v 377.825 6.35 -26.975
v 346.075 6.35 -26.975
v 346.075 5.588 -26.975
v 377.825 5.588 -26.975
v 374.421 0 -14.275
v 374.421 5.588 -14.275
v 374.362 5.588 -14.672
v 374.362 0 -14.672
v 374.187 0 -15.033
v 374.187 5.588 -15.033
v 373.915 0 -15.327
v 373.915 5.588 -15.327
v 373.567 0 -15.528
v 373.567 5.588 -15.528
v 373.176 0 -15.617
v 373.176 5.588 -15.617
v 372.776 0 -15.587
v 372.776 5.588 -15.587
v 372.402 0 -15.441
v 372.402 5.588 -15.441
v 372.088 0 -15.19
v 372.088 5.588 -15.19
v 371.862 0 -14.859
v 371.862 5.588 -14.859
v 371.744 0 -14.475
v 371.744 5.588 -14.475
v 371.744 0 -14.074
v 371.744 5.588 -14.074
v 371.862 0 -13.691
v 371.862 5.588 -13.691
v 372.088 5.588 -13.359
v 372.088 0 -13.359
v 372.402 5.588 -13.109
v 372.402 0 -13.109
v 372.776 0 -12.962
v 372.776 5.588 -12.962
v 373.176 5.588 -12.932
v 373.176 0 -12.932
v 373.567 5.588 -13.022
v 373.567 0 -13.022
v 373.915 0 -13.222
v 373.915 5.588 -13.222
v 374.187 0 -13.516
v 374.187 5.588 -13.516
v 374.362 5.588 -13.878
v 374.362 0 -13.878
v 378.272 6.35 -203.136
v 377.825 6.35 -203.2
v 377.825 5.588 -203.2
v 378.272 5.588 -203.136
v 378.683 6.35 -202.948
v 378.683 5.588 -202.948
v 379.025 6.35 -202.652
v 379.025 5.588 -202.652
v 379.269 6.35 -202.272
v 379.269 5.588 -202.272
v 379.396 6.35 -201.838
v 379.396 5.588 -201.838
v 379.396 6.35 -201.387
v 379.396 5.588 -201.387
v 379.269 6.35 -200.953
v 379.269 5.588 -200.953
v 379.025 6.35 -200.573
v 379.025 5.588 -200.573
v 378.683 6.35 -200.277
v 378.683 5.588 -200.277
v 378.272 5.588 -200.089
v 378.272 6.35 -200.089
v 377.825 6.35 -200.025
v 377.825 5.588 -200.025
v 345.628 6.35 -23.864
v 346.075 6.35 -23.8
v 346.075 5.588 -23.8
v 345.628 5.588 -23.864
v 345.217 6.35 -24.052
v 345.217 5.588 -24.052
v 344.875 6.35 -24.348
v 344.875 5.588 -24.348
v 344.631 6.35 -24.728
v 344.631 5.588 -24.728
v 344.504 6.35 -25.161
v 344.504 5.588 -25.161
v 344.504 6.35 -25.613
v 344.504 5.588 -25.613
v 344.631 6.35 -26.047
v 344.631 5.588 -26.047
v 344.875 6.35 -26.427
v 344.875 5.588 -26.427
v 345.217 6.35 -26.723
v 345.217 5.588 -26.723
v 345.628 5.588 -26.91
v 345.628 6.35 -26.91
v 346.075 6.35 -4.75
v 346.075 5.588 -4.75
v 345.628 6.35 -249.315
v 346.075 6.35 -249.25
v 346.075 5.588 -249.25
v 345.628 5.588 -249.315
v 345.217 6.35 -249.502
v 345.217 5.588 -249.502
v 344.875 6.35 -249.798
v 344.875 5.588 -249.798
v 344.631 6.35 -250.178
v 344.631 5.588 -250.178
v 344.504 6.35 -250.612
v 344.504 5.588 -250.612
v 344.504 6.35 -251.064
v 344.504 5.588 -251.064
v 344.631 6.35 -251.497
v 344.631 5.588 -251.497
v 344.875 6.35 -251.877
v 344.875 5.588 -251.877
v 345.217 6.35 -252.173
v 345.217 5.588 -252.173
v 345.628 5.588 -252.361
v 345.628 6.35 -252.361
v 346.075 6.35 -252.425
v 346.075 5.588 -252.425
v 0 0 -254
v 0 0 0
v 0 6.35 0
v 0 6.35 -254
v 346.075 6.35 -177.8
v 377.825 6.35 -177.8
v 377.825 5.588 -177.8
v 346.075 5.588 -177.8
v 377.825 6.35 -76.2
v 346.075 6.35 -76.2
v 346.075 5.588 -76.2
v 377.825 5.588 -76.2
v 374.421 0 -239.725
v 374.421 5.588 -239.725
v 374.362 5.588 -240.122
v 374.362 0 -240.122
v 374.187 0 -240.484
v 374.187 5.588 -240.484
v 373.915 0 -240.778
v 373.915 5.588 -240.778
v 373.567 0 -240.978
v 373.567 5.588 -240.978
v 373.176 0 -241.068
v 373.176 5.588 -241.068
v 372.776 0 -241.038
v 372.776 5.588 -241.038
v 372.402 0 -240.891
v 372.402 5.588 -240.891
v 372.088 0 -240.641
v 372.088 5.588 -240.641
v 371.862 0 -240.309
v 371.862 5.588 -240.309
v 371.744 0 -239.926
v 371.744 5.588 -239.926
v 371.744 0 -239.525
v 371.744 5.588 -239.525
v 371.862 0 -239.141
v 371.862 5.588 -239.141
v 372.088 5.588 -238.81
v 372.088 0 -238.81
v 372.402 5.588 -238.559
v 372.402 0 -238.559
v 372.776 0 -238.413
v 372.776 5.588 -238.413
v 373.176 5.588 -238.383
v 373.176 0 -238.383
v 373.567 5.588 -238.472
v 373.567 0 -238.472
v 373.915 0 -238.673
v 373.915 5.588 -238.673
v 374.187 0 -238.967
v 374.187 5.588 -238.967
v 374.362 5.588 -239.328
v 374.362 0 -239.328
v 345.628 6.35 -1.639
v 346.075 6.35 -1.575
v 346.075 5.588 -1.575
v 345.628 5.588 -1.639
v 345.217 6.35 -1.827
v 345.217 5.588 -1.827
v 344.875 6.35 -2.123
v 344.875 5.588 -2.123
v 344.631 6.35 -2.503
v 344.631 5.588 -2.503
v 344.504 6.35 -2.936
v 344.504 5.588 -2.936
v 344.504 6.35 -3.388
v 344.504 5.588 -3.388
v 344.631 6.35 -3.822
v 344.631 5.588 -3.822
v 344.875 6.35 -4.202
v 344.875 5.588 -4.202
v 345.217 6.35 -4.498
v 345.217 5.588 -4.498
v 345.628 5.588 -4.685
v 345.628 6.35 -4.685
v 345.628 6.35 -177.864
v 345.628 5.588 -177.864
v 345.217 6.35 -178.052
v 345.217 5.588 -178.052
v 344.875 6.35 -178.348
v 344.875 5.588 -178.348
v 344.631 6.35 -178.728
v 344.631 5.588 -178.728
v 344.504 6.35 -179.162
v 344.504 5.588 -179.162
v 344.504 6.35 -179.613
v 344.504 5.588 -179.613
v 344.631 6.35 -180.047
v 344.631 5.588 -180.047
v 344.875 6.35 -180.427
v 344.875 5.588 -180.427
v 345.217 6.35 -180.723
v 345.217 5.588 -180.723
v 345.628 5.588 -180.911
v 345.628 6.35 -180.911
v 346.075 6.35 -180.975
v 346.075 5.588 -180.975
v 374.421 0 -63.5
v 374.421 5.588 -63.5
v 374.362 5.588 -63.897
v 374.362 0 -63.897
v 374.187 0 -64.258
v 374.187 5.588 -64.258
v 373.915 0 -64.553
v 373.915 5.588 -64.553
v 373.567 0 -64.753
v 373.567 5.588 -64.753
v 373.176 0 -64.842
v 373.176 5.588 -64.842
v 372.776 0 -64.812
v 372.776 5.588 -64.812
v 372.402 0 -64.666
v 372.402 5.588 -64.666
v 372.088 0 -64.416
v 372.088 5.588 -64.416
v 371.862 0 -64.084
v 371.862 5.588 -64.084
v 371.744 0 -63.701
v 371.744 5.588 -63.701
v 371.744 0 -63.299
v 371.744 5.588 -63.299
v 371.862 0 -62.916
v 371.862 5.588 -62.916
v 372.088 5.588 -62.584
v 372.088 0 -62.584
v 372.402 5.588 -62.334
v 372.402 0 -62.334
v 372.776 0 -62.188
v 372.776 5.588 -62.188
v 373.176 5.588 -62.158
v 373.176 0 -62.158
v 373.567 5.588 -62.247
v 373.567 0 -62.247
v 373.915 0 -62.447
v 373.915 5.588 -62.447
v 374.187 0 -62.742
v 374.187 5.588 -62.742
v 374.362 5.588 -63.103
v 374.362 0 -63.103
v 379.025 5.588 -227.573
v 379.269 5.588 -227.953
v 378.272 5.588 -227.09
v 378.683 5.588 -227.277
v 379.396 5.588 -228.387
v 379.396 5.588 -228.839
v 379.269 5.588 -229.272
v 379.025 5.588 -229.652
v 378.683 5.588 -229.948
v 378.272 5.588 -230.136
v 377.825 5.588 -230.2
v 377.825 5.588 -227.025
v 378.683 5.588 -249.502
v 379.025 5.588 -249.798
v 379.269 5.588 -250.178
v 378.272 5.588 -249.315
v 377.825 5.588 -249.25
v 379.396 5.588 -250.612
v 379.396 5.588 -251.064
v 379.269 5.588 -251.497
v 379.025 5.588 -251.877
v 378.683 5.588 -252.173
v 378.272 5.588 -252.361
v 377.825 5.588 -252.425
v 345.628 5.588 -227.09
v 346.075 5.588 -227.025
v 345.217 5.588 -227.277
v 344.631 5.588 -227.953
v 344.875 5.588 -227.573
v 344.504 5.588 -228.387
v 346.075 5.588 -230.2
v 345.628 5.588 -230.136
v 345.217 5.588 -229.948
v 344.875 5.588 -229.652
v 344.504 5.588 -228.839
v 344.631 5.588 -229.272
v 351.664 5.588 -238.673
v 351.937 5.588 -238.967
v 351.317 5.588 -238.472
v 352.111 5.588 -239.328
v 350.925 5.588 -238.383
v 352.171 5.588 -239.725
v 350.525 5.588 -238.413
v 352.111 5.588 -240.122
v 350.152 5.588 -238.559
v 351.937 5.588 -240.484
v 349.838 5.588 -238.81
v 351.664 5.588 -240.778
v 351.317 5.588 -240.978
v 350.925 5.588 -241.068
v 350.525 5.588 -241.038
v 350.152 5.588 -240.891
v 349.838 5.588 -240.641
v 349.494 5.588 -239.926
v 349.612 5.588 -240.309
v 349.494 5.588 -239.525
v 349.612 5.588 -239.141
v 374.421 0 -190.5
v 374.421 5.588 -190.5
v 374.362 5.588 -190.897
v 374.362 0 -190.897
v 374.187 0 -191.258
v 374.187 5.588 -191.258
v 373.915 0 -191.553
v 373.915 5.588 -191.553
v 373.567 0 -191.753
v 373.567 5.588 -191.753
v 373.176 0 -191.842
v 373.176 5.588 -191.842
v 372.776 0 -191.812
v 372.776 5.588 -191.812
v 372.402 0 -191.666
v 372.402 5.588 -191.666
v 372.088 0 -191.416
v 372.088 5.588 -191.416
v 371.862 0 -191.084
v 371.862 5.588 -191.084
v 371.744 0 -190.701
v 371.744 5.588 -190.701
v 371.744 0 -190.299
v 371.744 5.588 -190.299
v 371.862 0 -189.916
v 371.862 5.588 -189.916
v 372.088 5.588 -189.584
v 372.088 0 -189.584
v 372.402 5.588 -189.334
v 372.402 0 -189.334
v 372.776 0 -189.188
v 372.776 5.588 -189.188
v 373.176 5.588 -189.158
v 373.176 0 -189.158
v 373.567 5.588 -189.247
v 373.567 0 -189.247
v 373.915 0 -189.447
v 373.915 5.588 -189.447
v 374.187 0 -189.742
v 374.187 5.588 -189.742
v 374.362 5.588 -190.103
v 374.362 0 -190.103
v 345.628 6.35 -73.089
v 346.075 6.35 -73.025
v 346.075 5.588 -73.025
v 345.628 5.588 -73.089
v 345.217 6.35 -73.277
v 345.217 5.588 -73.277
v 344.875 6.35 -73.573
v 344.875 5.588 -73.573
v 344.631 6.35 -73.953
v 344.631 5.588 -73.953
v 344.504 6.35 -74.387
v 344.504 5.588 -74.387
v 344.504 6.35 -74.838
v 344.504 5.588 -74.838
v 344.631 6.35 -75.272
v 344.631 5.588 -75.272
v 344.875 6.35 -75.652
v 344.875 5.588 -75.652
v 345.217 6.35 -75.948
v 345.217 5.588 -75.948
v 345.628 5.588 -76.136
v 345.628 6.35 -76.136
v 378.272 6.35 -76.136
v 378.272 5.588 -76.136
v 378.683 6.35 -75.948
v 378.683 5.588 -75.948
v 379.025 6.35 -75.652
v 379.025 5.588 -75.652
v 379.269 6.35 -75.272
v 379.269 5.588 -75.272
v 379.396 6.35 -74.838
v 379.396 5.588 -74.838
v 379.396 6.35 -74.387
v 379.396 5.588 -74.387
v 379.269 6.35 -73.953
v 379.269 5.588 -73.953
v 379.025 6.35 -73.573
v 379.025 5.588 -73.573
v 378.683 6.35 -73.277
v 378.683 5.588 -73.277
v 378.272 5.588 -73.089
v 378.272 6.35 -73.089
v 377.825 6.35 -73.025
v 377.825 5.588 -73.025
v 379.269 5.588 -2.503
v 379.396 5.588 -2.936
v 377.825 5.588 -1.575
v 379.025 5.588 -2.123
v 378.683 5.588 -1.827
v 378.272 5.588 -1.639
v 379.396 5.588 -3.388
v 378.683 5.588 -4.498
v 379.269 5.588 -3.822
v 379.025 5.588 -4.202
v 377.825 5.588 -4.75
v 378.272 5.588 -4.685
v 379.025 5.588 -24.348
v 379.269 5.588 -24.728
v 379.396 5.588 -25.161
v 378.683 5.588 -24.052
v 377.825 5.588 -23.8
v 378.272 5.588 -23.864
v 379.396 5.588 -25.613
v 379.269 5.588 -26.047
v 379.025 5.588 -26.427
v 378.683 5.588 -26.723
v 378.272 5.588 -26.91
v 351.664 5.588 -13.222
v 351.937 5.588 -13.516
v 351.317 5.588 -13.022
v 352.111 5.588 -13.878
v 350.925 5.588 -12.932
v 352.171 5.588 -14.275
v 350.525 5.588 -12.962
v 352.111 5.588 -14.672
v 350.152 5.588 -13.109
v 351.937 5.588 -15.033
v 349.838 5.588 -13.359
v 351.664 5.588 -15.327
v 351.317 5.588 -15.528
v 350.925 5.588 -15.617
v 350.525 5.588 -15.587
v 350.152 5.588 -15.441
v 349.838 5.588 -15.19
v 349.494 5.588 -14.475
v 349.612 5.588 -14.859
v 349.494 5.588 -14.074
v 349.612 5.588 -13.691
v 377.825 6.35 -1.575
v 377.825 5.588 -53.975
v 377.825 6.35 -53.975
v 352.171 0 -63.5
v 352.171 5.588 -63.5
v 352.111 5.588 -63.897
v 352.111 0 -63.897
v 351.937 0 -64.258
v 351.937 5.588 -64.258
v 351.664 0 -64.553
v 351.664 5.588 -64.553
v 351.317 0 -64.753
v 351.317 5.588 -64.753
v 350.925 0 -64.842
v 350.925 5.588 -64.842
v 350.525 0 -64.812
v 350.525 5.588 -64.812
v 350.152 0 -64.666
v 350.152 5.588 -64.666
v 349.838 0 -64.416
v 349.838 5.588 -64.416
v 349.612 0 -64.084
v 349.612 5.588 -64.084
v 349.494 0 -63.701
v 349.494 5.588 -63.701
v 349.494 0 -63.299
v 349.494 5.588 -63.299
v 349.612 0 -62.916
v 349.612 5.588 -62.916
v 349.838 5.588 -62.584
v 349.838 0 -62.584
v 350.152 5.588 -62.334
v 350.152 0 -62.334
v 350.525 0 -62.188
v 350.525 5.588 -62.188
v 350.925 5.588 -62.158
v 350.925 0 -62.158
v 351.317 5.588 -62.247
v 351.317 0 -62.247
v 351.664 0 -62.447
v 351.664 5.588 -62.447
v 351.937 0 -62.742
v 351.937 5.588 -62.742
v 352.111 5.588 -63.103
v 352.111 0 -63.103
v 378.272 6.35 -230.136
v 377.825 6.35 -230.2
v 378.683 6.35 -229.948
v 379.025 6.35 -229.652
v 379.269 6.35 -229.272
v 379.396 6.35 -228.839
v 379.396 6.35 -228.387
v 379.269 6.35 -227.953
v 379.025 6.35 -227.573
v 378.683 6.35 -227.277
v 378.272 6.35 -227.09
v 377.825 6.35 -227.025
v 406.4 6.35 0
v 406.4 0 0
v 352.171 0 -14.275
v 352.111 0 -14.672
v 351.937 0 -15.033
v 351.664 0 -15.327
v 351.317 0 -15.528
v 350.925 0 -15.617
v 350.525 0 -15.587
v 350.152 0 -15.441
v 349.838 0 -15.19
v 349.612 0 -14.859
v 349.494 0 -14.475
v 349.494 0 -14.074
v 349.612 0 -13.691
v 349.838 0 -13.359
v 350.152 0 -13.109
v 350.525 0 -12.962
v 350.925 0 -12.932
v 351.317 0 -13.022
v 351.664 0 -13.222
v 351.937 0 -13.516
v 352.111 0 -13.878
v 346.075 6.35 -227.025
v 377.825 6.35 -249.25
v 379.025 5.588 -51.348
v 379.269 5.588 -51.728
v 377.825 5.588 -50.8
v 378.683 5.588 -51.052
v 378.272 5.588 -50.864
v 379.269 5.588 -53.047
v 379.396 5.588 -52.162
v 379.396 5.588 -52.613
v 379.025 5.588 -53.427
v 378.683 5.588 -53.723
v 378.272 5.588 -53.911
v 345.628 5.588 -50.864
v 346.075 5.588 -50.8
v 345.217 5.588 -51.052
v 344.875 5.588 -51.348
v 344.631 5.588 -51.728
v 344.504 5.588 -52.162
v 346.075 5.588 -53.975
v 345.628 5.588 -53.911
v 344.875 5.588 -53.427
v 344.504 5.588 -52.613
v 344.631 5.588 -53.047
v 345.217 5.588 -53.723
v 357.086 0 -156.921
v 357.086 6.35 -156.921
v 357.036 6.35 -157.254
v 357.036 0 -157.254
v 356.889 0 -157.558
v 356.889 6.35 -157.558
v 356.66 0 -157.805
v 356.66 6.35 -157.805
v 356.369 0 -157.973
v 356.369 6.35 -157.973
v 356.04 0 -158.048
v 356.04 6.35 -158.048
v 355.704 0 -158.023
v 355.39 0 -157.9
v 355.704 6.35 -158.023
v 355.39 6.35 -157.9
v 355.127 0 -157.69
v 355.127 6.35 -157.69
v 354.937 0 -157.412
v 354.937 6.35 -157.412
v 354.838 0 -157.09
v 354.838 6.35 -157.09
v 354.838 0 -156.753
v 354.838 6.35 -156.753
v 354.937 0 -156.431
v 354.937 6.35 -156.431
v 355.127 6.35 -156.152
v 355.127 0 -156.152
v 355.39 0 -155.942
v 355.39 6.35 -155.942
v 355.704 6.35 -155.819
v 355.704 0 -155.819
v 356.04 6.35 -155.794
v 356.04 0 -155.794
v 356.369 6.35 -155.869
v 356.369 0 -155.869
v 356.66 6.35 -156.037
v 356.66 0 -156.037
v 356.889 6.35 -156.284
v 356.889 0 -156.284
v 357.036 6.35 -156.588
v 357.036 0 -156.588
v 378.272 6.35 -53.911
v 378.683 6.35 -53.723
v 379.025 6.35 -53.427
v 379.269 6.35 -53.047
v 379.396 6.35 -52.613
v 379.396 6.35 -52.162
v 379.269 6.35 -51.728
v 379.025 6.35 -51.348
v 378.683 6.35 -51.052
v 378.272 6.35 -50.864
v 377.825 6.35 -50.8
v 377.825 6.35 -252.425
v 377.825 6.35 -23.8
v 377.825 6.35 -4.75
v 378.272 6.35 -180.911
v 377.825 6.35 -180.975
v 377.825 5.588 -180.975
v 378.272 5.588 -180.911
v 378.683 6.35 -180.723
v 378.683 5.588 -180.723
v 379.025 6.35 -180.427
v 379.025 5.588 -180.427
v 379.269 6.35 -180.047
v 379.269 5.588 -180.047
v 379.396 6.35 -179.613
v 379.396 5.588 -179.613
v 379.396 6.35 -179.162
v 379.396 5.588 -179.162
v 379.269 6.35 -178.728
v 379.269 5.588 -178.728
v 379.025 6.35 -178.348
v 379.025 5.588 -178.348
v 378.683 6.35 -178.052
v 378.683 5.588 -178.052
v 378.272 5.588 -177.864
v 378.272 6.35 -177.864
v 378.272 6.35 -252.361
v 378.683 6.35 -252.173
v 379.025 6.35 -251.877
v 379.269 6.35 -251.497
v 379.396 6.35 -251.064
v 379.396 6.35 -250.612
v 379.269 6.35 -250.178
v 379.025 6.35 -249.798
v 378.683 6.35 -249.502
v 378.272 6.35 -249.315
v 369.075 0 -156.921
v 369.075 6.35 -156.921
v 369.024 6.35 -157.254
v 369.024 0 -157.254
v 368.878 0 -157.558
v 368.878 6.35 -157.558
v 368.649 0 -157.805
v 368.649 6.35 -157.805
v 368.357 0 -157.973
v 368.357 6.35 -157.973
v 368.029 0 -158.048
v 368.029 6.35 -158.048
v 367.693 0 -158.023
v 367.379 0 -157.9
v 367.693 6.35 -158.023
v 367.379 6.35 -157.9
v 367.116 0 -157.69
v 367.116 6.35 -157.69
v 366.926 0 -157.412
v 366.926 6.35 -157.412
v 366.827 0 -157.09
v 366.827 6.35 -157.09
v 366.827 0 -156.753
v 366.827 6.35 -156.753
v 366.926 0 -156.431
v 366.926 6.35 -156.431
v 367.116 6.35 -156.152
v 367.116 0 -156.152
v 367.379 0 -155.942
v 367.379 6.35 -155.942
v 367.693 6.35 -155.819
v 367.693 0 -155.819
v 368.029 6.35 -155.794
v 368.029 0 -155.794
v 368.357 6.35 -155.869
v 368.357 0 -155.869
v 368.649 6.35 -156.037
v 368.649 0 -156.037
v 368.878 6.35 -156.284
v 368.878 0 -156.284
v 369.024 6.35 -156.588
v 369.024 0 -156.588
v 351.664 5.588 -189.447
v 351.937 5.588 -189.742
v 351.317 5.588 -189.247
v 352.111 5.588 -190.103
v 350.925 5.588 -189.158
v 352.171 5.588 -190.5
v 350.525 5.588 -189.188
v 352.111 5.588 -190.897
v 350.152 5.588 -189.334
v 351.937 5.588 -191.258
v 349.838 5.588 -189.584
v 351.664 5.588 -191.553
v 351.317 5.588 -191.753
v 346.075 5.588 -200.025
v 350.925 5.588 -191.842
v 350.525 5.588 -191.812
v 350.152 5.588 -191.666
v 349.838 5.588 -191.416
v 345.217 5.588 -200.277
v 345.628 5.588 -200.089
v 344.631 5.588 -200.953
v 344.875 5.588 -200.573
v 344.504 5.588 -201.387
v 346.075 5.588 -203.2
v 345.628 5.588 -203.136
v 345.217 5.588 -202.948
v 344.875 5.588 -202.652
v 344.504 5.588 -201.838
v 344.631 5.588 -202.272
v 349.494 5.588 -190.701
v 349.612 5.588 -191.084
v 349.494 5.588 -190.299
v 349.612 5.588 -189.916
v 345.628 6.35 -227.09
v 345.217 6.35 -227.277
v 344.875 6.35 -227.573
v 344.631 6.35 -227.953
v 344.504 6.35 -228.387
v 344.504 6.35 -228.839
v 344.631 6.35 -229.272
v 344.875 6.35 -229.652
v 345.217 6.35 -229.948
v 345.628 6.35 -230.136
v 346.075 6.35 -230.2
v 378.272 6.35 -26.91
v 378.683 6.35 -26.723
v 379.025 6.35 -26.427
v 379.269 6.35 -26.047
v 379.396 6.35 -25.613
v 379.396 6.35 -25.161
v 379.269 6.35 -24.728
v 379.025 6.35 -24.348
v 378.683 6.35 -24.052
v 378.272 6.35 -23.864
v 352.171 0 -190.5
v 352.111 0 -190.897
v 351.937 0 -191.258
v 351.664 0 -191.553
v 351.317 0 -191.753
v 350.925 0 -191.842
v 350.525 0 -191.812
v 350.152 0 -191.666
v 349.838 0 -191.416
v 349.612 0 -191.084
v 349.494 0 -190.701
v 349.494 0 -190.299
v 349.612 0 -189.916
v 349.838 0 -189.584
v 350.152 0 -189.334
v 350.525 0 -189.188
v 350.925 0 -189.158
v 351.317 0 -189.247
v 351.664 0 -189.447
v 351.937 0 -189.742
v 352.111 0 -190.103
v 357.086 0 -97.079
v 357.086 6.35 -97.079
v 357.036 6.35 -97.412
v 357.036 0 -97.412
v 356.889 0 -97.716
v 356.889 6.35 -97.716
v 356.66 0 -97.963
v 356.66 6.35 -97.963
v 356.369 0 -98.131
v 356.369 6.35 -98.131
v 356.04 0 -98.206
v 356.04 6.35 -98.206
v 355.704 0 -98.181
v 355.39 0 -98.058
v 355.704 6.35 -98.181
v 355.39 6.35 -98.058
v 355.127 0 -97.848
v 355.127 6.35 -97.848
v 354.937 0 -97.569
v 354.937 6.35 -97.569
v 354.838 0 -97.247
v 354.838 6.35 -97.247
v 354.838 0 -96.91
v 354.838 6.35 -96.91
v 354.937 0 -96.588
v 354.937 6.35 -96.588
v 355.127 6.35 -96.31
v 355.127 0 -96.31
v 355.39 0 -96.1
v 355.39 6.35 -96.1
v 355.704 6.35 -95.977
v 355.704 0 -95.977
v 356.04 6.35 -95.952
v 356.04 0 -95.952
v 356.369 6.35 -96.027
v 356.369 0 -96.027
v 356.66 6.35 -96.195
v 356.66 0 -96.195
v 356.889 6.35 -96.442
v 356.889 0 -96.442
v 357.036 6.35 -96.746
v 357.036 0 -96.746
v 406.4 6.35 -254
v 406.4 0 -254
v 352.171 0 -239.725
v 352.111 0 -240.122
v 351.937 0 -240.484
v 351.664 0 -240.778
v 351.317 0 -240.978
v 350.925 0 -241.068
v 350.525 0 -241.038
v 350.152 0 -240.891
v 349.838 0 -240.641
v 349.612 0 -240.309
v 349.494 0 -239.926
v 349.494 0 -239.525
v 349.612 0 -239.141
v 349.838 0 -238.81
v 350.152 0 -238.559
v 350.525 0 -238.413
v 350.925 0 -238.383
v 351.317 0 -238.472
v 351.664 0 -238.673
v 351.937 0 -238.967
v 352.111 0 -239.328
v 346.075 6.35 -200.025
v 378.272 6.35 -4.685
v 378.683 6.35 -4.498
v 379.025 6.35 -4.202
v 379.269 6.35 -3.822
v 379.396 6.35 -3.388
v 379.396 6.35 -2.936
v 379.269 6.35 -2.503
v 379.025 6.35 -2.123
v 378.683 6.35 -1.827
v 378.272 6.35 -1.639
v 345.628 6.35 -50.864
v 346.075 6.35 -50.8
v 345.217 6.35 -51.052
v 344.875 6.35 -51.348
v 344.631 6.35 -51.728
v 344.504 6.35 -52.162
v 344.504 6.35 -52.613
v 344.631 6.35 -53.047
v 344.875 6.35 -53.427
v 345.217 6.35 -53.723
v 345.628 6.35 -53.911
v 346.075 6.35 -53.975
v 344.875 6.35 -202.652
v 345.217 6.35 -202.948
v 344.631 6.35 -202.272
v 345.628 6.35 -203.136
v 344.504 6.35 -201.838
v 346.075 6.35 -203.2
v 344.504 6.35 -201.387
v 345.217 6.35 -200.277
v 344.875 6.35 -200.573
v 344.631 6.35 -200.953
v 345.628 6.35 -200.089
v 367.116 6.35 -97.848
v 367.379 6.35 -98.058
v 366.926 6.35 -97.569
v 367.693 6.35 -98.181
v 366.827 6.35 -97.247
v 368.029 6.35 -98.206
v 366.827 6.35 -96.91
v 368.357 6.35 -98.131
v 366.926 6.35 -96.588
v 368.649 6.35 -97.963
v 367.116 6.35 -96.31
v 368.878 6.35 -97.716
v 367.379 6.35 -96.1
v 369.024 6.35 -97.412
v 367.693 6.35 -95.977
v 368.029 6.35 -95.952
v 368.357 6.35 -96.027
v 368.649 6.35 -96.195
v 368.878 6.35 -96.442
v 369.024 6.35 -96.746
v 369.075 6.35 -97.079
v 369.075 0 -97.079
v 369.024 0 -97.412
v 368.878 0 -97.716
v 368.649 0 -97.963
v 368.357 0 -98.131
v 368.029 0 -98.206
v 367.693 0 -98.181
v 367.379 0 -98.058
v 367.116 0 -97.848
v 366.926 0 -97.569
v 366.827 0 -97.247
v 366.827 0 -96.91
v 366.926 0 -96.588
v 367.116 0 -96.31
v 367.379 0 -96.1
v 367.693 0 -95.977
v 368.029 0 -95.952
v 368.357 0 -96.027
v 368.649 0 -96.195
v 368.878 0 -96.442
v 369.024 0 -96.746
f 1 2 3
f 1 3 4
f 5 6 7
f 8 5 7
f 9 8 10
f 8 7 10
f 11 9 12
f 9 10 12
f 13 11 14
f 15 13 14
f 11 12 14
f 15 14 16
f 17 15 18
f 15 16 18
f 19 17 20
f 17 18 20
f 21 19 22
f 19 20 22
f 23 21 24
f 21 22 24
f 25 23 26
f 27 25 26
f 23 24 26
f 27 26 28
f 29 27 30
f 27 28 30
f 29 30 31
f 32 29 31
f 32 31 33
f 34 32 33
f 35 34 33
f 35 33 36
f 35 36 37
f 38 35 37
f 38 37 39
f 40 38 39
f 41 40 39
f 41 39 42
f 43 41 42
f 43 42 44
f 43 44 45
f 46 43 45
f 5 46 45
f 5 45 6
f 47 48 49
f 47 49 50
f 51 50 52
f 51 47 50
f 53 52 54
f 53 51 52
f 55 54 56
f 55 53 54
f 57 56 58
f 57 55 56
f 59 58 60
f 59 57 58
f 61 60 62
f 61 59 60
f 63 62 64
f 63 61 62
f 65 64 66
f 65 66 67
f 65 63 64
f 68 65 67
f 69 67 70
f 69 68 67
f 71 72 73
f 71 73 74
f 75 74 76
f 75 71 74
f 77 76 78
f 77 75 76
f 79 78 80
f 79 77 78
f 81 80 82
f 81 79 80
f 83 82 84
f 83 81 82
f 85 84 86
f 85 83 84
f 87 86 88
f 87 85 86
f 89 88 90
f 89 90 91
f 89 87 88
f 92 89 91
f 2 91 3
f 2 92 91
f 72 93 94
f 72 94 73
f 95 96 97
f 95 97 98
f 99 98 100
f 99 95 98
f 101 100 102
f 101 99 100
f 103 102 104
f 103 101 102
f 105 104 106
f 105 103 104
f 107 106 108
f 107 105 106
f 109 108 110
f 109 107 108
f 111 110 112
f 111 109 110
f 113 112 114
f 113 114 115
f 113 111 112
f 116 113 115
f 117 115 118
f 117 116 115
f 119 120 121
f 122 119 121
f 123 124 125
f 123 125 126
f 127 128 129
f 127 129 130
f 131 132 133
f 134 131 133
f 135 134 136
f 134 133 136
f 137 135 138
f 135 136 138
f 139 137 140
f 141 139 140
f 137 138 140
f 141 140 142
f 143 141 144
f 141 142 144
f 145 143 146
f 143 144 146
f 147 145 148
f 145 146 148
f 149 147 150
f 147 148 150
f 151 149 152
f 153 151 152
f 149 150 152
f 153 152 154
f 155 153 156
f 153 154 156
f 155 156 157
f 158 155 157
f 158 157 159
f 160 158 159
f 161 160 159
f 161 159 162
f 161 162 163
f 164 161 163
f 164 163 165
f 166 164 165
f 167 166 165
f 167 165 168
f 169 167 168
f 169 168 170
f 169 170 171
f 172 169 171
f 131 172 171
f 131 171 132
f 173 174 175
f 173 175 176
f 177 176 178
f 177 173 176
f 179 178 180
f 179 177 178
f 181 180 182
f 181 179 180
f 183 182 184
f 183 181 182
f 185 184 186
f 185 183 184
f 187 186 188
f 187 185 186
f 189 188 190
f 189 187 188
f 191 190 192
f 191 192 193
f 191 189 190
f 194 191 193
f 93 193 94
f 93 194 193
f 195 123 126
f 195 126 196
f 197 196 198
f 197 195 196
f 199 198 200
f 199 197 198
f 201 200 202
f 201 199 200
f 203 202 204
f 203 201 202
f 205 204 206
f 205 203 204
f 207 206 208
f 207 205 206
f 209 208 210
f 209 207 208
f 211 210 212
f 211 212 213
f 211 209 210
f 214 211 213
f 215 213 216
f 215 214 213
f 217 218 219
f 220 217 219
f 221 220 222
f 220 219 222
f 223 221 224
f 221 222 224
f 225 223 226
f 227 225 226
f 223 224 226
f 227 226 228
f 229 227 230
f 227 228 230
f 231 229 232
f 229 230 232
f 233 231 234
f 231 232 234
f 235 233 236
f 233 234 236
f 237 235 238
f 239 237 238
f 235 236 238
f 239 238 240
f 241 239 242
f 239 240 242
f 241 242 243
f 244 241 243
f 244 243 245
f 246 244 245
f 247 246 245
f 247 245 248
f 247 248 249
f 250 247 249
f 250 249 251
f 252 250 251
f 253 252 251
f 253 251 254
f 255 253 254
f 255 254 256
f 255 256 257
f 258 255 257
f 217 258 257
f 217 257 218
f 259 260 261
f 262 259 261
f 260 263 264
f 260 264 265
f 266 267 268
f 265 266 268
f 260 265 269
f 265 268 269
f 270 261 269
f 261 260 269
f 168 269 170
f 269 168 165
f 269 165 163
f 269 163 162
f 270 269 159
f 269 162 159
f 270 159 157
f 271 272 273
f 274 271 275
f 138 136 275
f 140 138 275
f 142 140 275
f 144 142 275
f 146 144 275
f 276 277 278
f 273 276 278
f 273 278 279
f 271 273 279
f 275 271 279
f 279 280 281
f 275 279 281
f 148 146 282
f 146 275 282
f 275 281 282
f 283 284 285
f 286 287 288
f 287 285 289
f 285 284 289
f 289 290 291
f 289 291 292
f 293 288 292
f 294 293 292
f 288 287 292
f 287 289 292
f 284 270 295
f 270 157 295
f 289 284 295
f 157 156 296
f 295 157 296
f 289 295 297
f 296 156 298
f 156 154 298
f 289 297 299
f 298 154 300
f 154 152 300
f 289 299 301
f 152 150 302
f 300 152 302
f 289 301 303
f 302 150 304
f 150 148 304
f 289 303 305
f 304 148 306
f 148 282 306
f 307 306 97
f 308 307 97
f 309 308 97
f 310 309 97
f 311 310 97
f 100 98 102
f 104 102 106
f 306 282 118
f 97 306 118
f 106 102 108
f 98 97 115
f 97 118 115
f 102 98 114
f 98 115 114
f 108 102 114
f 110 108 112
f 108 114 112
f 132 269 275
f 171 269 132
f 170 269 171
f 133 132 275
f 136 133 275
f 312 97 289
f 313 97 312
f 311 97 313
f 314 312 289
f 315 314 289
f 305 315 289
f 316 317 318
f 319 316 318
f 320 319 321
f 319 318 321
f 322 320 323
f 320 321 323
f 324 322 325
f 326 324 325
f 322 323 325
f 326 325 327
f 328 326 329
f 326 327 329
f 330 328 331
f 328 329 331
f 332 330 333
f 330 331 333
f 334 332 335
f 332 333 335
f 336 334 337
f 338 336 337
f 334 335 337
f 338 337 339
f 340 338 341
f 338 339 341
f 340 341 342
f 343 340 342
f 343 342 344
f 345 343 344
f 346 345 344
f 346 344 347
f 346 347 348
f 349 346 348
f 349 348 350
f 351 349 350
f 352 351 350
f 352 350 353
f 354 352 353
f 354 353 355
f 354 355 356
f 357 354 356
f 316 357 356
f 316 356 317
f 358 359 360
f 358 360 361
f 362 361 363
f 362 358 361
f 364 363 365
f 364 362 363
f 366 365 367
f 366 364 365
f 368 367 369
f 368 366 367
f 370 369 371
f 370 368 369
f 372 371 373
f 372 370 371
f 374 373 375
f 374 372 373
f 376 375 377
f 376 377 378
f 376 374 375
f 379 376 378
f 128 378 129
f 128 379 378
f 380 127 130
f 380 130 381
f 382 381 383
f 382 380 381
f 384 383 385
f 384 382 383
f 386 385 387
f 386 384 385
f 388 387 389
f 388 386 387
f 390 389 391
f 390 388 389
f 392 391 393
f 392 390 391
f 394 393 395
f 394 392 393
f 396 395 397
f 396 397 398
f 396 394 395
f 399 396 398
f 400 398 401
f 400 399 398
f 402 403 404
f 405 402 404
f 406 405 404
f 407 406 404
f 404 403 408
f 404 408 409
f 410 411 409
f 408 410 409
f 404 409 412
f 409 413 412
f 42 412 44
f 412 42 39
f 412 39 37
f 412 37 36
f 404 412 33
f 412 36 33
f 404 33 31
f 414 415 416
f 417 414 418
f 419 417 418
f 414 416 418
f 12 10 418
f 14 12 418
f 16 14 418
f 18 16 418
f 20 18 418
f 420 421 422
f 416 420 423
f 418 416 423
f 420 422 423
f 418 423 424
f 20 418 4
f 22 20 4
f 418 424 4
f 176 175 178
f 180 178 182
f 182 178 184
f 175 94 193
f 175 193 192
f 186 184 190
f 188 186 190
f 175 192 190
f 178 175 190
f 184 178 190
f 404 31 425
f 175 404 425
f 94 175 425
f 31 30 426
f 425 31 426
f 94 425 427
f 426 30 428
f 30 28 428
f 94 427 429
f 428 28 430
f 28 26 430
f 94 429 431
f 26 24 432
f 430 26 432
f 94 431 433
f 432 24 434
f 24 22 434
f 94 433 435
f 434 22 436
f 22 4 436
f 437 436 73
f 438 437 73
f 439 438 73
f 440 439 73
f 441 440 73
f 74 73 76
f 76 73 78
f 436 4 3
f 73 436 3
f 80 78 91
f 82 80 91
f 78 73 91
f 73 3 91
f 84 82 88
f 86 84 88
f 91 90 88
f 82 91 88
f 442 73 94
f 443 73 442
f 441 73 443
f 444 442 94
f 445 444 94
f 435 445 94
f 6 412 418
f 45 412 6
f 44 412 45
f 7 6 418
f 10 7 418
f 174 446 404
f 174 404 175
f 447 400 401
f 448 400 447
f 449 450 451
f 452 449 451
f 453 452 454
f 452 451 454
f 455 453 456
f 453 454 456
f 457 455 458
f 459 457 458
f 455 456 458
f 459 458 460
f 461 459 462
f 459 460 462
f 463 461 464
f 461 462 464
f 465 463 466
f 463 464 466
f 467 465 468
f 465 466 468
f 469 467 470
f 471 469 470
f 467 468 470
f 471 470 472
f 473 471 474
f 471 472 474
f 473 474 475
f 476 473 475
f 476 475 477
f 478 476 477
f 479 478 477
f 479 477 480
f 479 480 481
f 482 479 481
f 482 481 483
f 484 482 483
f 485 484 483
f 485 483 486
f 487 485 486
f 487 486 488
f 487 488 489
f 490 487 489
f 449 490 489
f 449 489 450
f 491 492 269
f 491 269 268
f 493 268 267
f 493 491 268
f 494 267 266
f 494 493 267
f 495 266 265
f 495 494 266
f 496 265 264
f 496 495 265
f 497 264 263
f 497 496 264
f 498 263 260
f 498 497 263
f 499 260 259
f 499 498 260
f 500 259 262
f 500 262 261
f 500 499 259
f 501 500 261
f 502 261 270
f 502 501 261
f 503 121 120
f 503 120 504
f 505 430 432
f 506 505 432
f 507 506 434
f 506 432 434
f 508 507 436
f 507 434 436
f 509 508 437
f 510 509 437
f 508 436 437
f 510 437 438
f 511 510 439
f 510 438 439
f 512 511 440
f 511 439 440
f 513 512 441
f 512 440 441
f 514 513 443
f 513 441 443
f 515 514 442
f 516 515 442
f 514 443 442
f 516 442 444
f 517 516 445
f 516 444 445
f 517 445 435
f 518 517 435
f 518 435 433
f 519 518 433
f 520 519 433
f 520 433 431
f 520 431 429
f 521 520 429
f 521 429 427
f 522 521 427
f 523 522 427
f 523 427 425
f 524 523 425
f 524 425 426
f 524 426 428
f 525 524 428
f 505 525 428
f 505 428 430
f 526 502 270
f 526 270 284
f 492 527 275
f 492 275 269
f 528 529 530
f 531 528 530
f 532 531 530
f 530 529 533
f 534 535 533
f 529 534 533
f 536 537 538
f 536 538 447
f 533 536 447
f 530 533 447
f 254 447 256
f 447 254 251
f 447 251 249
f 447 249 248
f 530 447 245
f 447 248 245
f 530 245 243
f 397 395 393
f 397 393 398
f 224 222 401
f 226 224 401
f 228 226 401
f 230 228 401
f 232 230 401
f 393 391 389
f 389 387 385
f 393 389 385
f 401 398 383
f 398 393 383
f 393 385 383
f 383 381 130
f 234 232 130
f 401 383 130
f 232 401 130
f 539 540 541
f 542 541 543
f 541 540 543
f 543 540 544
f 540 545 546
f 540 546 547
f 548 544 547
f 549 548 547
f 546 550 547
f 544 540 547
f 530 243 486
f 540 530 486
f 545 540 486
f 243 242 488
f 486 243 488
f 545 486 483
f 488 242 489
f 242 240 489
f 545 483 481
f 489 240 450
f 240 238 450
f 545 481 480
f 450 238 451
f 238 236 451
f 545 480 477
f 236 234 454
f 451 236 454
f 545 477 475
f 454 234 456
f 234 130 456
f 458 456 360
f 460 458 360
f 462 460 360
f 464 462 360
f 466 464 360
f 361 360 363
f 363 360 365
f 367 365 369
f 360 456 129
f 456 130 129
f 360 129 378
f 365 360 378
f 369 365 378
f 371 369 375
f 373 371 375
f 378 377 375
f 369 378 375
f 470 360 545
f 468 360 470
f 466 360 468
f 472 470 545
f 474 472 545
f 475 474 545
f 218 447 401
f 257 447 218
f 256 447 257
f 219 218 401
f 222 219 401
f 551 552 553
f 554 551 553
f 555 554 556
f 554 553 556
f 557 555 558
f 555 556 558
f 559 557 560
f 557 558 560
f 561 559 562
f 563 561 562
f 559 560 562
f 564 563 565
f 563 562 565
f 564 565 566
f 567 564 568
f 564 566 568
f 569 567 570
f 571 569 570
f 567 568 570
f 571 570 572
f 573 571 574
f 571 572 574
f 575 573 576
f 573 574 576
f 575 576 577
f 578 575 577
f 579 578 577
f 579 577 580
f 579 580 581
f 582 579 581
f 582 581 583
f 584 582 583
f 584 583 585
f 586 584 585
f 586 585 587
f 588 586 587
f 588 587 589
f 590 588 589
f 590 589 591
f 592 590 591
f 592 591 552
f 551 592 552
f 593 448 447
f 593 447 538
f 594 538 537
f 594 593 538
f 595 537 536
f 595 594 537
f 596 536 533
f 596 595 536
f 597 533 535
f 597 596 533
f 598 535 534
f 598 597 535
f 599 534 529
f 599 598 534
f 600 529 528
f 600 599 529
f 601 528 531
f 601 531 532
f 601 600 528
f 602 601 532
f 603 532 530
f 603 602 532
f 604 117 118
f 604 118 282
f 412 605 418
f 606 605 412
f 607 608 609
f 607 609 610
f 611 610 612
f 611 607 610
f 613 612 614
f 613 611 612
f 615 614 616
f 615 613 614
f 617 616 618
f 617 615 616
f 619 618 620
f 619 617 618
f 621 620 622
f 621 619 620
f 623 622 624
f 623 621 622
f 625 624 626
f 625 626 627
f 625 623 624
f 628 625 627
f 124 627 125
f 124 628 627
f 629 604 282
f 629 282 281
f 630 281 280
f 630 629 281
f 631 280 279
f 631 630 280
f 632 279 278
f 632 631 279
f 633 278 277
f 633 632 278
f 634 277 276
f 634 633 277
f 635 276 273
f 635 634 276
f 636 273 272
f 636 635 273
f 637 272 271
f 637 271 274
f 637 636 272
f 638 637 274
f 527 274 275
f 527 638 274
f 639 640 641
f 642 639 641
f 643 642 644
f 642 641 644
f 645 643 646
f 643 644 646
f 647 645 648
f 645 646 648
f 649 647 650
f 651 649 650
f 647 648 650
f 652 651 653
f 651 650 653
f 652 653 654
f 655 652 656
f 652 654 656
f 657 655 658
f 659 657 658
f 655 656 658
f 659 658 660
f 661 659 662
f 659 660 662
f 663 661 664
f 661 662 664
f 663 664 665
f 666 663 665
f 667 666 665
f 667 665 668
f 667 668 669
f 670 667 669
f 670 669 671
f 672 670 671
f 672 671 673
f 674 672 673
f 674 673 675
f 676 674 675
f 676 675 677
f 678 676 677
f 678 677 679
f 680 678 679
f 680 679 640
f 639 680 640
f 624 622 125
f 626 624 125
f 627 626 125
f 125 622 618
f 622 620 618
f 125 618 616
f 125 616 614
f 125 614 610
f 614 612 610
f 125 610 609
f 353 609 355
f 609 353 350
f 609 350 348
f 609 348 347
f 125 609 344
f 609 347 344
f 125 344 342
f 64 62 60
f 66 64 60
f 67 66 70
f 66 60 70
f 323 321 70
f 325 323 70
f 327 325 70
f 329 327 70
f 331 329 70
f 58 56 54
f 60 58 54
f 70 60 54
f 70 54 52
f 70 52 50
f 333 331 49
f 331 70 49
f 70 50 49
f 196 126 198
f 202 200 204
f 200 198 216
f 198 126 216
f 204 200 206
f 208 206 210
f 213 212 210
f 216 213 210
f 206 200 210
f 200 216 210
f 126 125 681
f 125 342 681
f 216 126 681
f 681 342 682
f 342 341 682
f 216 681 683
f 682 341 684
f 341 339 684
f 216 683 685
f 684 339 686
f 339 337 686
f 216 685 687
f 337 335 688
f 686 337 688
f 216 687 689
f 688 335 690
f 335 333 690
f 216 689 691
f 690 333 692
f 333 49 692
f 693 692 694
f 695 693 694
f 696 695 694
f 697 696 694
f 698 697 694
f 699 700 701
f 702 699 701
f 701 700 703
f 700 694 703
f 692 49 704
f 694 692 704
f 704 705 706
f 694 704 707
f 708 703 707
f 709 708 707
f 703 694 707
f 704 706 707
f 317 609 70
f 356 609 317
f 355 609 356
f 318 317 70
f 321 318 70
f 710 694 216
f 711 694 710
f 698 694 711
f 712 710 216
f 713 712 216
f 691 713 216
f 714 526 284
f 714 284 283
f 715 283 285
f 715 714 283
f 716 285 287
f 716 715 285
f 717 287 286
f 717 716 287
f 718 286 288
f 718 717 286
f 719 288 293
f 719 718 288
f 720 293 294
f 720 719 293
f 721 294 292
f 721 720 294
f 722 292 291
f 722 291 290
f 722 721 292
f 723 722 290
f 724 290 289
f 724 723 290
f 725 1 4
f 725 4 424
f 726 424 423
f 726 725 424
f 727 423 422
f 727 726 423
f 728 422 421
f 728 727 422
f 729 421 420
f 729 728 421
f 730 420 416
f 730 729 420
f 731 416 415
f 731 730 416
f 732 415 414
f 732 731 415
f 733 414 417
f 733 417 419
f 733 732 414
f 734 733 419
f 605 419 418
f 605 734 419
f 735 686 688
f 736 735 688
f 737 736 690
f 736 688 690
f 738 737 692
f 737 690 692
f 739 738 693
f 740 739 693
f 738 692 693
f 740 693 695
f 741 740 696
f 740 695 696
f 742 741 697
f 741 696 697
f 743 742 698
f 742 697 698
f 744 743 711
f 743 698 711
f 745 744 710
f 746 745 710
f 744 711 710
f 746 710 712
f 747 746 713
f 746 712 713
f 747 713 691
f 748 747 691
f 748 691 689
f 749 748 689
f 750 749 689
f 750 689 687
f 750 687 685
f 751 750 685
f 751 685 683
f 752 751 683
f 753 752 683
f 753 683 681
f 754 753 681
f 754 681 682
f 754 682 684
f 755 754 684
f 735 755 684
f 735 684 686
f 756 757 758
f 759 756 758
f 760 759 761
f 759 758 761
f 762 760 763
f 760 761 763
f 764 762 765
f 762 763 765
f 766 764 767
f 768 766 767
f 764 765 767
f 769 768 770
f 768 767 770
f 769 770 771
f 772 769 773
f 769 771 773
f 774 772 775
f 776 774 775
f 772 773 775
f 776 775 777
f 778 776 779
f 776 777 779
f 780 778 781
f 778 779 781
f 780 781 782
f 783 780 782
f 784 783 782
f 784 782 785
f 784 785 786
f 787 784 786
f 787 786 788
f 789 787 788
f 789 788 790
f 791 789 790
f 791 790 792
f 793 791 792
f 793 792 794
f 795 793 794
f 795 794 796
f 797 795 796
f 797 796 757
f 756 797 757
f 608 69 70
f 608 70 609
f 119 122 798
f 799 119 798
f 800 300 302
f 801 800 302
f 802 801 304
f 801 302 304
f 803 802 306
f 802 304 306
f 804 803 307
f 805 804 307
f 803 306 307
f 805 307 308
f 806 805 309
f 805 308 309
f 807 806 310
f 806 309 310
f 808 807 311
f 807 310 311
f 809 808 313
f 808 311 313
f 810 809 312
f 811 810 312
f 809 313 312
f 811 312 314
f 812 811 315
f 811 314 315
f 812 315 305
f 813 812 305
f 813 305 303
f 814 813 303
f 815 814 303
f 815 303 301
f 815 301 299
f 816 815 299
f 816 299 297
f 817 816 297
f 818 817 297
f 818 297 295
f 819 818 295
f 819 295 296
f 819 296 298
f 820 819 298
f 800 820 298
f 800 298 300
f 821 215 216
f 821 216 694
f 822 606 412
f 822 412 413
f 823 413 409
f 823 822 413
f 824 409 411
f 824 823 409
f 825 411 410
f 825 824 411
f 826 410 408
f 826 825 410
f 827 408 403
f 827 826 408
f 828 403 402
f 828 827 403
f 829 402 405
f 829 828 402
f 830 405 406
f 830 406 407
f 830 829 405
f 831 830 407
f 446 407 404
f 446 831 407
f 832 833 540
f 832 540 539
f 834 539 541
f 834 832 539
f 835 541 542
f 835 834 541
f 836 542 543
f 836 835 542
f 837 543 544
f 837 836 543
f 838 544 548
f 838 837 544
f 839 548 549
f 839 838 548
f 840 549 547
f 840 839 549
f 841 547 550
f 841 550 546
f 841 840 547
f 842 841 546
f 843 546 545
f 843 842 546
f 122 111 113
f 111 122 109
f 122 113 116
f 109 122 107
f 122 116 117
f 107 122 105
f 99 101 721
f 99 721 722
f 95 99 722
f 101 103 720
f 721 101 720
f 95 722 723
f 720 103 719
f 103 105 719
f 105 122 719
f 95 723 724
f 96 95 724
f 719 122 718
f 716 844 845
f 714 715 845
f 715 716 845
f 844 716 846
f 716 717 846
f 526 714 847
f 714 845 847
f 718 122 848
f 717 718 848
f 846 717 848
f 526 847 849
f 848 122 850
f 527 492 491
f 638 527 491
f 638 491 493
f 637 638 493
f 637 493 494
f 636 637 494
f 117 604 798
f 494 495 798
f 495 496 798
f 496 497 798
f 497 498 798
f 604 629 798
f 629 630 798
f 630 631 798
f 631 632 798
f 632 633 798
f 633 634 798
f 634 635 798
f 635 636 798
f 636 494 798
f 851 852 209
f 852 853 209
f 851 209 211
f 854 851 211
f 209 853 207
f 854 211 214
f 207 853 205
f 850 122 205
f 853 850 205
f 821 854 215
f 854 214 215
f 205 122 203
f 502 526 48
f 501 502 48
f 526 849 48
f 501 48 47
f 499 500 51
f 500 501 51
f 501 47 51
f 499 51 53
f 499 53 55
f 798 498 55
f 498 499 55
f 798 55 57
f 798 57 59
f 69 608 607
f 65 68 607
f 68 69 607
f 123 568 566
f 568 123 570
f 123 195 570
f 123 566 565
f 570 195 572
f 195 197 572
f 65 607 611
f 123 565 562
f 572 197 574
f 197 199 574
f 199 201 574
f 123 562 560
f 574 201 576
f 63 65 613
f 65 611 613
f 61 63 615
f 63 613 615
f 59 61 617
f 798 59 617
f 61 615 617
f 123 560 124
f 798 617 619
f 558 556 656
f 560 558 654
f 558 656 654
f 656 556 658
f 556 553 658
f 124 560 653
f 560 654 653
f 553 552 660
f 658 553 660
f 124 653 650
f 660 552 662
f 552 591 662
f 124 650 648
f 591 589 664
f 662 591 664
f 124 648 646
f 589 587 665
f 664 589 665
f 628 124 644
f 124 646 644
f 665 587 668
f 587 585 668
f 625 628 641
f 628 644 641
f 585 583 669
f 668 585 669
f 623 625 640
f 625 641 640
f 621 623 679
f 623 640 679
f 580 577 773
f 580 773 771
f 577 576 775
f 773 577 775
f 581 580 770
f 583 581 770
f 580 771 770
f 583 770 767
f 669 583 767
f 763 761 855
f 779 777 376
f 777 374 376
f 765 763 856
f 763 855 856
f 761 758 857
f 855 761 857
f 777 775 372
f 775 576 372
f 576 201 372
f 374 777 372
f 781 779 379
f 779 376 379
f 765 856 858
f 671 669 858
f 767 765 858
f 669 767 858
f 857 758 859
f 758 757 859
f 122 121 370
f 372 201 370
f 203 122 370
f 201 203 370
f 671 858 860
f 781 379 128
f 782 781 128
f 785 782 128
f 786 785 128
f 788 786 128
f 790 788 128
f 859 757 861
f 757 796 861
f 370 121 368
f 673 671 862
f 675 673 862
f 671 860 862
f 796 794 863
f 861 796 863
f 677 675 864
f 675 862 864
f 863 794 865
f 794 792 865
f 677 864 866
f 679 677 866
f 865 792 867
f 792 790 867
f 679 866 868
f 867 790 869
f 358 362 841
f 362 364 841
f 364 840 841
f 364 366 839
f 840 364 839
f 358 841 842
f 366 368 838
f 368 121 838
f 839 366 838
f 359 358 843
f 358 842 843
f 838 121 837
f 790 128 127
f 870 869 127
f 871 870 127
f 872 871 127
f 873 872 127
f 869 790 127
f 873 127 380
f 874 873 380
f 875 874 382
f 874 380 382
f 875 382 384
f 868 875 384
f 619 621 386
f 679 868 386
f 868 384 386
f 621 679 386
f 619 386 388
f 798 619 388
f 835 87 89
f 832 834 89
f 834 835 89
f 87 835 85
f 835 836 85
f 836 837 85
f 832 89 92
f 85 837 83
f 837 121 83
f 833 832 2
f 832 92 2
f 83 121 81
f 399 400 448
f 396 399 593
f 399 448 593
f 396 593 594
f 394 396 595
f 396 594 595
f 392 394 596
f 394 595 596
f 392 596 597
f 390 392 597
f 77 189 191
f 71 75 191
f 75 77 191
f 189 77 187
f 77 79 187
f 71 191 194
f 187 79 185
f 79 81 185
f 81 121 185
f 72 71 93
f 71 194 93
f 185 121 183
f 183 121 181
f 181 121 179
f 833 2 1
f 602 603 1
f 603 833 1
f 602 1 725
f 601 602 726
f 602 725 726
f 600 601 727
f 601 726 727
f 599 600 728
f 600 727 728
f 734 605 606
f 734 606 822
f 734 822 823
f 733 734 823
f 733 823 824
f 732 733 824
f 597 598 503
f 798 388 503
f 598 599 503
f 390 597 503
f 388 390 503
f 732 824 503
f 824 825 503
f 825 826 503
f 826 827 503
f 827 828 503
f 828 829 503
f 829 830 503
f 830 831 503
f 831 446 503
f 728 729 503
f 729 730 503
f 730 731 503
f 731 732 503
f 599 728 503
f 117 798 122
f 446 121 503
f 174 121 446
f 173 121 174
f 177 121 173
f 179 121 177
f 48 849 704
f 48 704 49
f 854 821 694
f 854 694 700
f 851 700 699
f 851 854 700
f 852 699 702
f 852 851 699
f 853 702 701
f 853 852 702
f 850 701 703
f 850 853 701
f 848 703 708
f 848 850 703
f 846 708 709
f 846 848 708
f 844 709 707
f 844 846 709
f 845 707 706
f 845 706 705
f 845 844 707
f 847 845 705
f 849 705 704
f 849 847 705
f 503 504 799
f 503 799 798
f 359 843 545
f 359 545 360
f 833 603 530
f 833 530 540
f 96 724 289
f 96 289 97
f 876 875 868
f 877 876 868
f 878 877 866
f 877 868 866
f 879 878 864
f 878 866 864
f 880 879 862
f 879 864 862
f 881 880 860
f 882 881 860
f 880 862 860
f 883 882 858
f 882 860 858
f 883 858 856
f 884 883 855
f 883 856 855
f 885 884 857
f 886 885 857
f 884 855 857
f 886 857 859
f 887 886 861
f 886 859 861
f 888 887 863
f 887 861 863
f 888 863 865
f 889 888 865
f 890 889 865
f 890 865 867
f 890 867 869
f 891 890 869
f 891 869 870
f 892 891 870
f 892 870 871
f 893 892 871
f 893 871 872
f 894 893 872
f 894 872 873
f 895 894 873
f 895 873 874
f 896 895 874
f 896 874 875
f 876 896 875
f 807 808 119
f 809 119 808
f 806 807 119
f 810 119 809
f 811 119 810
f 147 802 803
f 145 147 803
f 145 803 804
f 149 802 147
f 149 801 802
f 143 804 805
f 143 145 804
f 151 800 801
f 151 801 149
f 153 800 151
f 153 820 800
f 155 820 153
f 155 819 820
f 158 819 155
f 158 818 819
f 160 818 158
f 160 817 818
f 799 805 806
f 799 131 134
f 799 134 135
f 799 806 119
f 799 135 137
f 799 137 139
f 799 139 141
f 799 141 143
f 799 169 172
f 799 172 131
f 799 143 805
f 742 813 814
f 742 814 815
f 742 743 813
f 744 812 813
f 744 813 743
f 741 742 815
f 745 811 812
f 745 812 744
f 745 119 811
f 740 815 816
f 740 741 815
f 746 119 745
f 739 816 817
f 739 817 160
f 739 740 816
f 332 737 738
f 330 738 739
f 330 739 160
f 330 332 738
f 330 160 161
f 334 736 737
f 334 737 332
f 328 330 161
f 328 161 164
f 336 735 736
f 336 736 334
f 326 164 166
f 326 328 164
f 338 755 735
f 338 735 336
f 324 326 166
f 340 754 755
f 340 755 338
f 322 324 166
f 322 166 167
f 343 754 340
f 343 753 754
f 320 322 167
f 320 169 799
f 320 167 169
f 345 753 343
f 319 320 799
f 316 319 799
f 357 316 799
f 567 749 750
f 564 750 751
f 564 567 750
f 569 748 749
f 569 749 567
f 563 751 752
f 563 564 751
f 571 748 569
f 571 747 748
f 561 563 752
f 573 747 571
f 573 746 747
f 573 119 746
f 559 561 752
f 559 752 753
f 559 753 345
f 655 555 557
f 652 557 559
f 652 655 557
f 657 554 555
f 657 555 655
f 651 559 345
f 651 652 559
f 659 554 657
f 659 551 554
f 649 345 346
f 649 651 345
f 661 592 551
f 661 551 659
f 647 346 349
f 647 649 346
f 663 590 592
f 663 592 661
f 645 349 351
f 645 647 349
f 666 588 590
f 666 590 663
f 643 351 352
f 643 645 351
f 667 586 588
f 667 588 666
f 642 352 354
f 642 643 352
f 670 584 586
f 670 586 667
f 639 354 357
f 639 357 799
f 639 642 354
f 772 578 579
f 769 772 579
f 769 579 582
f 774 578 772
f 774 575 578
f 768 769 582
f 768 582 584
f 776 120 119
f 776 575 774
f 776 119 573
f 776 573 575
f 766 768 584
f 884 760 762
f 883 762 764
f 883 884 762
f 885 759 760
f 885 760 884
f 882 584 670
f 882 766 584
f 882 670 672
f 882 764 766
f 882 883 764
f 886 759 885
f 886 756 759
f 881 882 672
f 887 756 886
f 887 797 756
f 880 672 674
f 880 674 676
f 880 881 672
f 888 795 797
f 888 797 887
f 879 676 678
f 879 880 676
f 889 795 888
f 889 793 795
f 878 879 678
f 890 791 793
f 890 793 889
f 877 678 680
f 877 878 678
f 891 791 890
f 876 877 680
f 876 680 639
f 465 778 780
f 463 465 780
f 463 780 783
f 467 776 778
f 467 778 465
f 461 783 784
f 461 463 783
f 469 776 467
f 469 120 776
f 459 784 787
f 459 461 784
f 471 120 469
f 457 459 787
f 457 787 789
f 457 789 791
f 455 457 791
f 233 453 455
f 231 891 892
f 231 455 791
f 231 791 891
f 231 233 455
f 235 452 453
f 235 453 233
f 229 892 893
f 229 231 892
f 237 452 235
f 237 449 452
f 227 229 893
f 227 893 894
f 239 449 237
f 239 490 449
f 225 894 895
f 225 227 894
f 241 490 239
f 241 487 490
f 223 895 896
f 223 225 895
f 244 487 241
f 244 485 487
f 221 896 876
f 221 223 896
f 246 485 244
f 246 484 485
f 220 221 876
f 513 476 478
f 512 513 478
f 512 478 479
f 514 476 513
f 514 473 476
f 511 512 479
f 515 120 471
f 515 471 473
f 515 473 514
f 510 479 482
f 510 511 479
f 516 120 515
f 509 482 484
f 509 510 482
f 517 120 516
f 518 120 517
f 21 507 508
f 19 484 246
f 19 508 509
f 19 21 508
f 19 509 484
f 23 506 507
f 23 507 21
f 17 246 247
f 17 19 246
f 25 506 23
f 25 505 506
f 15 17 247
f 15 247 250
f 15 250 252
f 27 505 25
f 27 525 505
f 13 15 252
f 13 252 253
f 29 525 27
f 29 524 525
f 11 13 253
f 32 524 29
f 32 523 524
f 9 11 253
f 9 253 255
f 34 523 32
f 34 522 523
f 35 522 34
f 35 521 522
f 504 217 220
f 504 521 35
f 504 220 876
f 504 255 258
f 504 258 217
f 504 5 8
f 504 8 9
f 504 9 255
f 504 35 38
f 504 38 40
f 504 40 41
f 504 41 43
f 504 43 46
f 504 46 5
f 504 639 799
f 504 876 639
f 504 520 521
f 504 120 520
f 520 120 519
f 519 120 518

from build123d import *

# Parameters (mm, degrees)
SKETCH2_W           = 406.4
SKETCH2_H           = 6.35
BOSS_EXTRUDE1_DEPTH = 254
SKETCH3_R           = 1.3462
SKETCH3_R_2         = 1.1303
CUT_EXTRUDE1_DEPTH  = 7.35
CUT_EXTRUDE3_DEPTH  = 0.762


with BuildPart() as part:
    # Sketch2 → Boss-Extrude1 (new body)
    with BuildSketch(Plane.XY):
        with Locations((203.2, 3.175)):
            Rectangle(SKETCH2_W, SKETCH2_H)
    extrude(amount=-BOSS_EXTRUDE1_DEPTH)

    # Sketch3 → Cut-Extrude1 (cut, through all)
    with BuildSketch(Plane(origin=(0, 6.35, 0), x_dir=(1, 0, 0), z_dir=(0, 1, 0))):
        with Locations((350.8248, 239.7252)):
            Circle(SKETCH3_R)
        with Locations((373.0752, 239.7252)):
            Circle(SKETCH3_R)
        with Locations((373.0752, 190.5)):
            Circle(SKETCH3_R)
        with Locations((350.8248, 190.5)):
            Circle(SKETCH3_R)
        with Locations((355.9556, 156.9212)):
            Circle(SKETCH3_R_2)
        with Locations((367.9444, 156.9212)):
            Circle(SKETCH3_R_2)
        with Locations((367.9444, 97.0788)):
            Circle(SKETCH3_R_2)
        with Locations((355.9556, 97.0788)):
            Circle(SKETCH3_R_2)
        with Locations((373.0752, 63.5)):
            Circle(SKETCH3_R)
        with Locations((350.8248, 63.5)):
            Circle(SKETCH3_R)
        with Locations((350.8248, 14.2748)):
            Circle(SKETCH3_R)
        with Locations((373.0752, 14.2748)):
            Circle(SKETCH3_R)
    extrude(amount=-CUT_EXTRUDE1_DEPTH, mode=Mode.SUBTRACT)

    # Sketch4 → Cut-Extrude3 (cut)
    with BuildSketch(Plane(origin=(0, 6.35, 0), x_dir=(1, 0, 0), z_dir=(0, 1, 0))):
        with BuildLine():
            Line((346.075, 252.4252), (377.825, 252.4252))
            ThreePointArc((377.825, 252.4252), (379.4125, 250.8377), (377.825, 249.2502))
            Line((377.825, 249.2502), (377.825, 230.2002))
            ThreePointArc((377.825, 230.2002), (379.4125, 228.6127), (377.825, 227.0252))
            Line((377.825, 227.0252), (346.075, 227.0252))
            ThreePointArc((346.075, 227.0252), (344.4875, 228.6127), (346.075, 230.2002))
            Line((346.075, 230.2002), (346.075, 249.2502))
            ThreePointArc((346.075, 249.2502), (344.4875, 250.8377), (346.075, 252.4252))
        make_face()
        with BuildLine():
            Line((346.075, 203.2), (377.825, 203.2))
            ThreePointArc((377.825, 203.2), (379.4125, 201.6125), (377.825, 200.025))
            Line((377.825, 200.025), (377.825, 180.975))
            ThreePointArc((377.825, 180.975), (379.4125, 179.3875), (377.825, 177.8))
            Line((377.825, 177.8), (346.075, 177.8))
            ThreePointArc((346.075, 177.8), (344.4875, 179.3875), (346.075, 180.975))
            Line((346.075, 180.975), (346.075, 200.025))
            ThreePointArc((346.075, 200.025), (344.4875, 201.6125), (346.075, 203.2))
        make_face()
        with BuildLine():
            Line((346.075, 4.7498), (346.075, 23.7998))
            ThreePointArc((346.075, 23.7998), (344.4875, 25.3873), (346.075, 26.9748))
            Line((346.075, 26.9748), (377.825, 26.9748))
            ThreePointArc((377.825, 26.9748), (379.4125, 25.3873), (377.825, 23.7998))
            Line((377.825, 23.7998), (377.825, 4.7498))
            ThreePointArc((377.825, 4.7498), (379.4125, 3.1623), (377.825, 1.5748))
            Line((377.825, 1.5748), (346.075, 1.5748))
            ThreePointArc((346.075, 1.5748), (344.4875, 3.1623), (346.075, 4.7498))
        make_face()
        with BuildLine():
            Line((346.075, 53.975), (346.075, 73.025))
            ThreePointArc((346.075, 73.025), (344.4875, 74.6125), (346.075, 76.2))
            Line((346.075, 76.2), (377.825, 76.2))
            ThreePointArc((377.825, 76.2), (379.4125, 74.6125), (377.825, 73.025))
            Line((377.825, 73.025), (377.825, 53.975))
            ThreePointArc((377.825, 53.975), (379.4125, 52.3875), (377.825, 50.8))
            Line((377.825, 50.8), (346.075, 50.8))
            ThreePointArc((346.075, 50.8), (344.4875, 52.3875), (346.075, 53.975))
        make_face()
    extrude(amount=-CUT_EXTRUDE3_DEPTH, mode=Mode.SUBTRACT)


solid = part.part
